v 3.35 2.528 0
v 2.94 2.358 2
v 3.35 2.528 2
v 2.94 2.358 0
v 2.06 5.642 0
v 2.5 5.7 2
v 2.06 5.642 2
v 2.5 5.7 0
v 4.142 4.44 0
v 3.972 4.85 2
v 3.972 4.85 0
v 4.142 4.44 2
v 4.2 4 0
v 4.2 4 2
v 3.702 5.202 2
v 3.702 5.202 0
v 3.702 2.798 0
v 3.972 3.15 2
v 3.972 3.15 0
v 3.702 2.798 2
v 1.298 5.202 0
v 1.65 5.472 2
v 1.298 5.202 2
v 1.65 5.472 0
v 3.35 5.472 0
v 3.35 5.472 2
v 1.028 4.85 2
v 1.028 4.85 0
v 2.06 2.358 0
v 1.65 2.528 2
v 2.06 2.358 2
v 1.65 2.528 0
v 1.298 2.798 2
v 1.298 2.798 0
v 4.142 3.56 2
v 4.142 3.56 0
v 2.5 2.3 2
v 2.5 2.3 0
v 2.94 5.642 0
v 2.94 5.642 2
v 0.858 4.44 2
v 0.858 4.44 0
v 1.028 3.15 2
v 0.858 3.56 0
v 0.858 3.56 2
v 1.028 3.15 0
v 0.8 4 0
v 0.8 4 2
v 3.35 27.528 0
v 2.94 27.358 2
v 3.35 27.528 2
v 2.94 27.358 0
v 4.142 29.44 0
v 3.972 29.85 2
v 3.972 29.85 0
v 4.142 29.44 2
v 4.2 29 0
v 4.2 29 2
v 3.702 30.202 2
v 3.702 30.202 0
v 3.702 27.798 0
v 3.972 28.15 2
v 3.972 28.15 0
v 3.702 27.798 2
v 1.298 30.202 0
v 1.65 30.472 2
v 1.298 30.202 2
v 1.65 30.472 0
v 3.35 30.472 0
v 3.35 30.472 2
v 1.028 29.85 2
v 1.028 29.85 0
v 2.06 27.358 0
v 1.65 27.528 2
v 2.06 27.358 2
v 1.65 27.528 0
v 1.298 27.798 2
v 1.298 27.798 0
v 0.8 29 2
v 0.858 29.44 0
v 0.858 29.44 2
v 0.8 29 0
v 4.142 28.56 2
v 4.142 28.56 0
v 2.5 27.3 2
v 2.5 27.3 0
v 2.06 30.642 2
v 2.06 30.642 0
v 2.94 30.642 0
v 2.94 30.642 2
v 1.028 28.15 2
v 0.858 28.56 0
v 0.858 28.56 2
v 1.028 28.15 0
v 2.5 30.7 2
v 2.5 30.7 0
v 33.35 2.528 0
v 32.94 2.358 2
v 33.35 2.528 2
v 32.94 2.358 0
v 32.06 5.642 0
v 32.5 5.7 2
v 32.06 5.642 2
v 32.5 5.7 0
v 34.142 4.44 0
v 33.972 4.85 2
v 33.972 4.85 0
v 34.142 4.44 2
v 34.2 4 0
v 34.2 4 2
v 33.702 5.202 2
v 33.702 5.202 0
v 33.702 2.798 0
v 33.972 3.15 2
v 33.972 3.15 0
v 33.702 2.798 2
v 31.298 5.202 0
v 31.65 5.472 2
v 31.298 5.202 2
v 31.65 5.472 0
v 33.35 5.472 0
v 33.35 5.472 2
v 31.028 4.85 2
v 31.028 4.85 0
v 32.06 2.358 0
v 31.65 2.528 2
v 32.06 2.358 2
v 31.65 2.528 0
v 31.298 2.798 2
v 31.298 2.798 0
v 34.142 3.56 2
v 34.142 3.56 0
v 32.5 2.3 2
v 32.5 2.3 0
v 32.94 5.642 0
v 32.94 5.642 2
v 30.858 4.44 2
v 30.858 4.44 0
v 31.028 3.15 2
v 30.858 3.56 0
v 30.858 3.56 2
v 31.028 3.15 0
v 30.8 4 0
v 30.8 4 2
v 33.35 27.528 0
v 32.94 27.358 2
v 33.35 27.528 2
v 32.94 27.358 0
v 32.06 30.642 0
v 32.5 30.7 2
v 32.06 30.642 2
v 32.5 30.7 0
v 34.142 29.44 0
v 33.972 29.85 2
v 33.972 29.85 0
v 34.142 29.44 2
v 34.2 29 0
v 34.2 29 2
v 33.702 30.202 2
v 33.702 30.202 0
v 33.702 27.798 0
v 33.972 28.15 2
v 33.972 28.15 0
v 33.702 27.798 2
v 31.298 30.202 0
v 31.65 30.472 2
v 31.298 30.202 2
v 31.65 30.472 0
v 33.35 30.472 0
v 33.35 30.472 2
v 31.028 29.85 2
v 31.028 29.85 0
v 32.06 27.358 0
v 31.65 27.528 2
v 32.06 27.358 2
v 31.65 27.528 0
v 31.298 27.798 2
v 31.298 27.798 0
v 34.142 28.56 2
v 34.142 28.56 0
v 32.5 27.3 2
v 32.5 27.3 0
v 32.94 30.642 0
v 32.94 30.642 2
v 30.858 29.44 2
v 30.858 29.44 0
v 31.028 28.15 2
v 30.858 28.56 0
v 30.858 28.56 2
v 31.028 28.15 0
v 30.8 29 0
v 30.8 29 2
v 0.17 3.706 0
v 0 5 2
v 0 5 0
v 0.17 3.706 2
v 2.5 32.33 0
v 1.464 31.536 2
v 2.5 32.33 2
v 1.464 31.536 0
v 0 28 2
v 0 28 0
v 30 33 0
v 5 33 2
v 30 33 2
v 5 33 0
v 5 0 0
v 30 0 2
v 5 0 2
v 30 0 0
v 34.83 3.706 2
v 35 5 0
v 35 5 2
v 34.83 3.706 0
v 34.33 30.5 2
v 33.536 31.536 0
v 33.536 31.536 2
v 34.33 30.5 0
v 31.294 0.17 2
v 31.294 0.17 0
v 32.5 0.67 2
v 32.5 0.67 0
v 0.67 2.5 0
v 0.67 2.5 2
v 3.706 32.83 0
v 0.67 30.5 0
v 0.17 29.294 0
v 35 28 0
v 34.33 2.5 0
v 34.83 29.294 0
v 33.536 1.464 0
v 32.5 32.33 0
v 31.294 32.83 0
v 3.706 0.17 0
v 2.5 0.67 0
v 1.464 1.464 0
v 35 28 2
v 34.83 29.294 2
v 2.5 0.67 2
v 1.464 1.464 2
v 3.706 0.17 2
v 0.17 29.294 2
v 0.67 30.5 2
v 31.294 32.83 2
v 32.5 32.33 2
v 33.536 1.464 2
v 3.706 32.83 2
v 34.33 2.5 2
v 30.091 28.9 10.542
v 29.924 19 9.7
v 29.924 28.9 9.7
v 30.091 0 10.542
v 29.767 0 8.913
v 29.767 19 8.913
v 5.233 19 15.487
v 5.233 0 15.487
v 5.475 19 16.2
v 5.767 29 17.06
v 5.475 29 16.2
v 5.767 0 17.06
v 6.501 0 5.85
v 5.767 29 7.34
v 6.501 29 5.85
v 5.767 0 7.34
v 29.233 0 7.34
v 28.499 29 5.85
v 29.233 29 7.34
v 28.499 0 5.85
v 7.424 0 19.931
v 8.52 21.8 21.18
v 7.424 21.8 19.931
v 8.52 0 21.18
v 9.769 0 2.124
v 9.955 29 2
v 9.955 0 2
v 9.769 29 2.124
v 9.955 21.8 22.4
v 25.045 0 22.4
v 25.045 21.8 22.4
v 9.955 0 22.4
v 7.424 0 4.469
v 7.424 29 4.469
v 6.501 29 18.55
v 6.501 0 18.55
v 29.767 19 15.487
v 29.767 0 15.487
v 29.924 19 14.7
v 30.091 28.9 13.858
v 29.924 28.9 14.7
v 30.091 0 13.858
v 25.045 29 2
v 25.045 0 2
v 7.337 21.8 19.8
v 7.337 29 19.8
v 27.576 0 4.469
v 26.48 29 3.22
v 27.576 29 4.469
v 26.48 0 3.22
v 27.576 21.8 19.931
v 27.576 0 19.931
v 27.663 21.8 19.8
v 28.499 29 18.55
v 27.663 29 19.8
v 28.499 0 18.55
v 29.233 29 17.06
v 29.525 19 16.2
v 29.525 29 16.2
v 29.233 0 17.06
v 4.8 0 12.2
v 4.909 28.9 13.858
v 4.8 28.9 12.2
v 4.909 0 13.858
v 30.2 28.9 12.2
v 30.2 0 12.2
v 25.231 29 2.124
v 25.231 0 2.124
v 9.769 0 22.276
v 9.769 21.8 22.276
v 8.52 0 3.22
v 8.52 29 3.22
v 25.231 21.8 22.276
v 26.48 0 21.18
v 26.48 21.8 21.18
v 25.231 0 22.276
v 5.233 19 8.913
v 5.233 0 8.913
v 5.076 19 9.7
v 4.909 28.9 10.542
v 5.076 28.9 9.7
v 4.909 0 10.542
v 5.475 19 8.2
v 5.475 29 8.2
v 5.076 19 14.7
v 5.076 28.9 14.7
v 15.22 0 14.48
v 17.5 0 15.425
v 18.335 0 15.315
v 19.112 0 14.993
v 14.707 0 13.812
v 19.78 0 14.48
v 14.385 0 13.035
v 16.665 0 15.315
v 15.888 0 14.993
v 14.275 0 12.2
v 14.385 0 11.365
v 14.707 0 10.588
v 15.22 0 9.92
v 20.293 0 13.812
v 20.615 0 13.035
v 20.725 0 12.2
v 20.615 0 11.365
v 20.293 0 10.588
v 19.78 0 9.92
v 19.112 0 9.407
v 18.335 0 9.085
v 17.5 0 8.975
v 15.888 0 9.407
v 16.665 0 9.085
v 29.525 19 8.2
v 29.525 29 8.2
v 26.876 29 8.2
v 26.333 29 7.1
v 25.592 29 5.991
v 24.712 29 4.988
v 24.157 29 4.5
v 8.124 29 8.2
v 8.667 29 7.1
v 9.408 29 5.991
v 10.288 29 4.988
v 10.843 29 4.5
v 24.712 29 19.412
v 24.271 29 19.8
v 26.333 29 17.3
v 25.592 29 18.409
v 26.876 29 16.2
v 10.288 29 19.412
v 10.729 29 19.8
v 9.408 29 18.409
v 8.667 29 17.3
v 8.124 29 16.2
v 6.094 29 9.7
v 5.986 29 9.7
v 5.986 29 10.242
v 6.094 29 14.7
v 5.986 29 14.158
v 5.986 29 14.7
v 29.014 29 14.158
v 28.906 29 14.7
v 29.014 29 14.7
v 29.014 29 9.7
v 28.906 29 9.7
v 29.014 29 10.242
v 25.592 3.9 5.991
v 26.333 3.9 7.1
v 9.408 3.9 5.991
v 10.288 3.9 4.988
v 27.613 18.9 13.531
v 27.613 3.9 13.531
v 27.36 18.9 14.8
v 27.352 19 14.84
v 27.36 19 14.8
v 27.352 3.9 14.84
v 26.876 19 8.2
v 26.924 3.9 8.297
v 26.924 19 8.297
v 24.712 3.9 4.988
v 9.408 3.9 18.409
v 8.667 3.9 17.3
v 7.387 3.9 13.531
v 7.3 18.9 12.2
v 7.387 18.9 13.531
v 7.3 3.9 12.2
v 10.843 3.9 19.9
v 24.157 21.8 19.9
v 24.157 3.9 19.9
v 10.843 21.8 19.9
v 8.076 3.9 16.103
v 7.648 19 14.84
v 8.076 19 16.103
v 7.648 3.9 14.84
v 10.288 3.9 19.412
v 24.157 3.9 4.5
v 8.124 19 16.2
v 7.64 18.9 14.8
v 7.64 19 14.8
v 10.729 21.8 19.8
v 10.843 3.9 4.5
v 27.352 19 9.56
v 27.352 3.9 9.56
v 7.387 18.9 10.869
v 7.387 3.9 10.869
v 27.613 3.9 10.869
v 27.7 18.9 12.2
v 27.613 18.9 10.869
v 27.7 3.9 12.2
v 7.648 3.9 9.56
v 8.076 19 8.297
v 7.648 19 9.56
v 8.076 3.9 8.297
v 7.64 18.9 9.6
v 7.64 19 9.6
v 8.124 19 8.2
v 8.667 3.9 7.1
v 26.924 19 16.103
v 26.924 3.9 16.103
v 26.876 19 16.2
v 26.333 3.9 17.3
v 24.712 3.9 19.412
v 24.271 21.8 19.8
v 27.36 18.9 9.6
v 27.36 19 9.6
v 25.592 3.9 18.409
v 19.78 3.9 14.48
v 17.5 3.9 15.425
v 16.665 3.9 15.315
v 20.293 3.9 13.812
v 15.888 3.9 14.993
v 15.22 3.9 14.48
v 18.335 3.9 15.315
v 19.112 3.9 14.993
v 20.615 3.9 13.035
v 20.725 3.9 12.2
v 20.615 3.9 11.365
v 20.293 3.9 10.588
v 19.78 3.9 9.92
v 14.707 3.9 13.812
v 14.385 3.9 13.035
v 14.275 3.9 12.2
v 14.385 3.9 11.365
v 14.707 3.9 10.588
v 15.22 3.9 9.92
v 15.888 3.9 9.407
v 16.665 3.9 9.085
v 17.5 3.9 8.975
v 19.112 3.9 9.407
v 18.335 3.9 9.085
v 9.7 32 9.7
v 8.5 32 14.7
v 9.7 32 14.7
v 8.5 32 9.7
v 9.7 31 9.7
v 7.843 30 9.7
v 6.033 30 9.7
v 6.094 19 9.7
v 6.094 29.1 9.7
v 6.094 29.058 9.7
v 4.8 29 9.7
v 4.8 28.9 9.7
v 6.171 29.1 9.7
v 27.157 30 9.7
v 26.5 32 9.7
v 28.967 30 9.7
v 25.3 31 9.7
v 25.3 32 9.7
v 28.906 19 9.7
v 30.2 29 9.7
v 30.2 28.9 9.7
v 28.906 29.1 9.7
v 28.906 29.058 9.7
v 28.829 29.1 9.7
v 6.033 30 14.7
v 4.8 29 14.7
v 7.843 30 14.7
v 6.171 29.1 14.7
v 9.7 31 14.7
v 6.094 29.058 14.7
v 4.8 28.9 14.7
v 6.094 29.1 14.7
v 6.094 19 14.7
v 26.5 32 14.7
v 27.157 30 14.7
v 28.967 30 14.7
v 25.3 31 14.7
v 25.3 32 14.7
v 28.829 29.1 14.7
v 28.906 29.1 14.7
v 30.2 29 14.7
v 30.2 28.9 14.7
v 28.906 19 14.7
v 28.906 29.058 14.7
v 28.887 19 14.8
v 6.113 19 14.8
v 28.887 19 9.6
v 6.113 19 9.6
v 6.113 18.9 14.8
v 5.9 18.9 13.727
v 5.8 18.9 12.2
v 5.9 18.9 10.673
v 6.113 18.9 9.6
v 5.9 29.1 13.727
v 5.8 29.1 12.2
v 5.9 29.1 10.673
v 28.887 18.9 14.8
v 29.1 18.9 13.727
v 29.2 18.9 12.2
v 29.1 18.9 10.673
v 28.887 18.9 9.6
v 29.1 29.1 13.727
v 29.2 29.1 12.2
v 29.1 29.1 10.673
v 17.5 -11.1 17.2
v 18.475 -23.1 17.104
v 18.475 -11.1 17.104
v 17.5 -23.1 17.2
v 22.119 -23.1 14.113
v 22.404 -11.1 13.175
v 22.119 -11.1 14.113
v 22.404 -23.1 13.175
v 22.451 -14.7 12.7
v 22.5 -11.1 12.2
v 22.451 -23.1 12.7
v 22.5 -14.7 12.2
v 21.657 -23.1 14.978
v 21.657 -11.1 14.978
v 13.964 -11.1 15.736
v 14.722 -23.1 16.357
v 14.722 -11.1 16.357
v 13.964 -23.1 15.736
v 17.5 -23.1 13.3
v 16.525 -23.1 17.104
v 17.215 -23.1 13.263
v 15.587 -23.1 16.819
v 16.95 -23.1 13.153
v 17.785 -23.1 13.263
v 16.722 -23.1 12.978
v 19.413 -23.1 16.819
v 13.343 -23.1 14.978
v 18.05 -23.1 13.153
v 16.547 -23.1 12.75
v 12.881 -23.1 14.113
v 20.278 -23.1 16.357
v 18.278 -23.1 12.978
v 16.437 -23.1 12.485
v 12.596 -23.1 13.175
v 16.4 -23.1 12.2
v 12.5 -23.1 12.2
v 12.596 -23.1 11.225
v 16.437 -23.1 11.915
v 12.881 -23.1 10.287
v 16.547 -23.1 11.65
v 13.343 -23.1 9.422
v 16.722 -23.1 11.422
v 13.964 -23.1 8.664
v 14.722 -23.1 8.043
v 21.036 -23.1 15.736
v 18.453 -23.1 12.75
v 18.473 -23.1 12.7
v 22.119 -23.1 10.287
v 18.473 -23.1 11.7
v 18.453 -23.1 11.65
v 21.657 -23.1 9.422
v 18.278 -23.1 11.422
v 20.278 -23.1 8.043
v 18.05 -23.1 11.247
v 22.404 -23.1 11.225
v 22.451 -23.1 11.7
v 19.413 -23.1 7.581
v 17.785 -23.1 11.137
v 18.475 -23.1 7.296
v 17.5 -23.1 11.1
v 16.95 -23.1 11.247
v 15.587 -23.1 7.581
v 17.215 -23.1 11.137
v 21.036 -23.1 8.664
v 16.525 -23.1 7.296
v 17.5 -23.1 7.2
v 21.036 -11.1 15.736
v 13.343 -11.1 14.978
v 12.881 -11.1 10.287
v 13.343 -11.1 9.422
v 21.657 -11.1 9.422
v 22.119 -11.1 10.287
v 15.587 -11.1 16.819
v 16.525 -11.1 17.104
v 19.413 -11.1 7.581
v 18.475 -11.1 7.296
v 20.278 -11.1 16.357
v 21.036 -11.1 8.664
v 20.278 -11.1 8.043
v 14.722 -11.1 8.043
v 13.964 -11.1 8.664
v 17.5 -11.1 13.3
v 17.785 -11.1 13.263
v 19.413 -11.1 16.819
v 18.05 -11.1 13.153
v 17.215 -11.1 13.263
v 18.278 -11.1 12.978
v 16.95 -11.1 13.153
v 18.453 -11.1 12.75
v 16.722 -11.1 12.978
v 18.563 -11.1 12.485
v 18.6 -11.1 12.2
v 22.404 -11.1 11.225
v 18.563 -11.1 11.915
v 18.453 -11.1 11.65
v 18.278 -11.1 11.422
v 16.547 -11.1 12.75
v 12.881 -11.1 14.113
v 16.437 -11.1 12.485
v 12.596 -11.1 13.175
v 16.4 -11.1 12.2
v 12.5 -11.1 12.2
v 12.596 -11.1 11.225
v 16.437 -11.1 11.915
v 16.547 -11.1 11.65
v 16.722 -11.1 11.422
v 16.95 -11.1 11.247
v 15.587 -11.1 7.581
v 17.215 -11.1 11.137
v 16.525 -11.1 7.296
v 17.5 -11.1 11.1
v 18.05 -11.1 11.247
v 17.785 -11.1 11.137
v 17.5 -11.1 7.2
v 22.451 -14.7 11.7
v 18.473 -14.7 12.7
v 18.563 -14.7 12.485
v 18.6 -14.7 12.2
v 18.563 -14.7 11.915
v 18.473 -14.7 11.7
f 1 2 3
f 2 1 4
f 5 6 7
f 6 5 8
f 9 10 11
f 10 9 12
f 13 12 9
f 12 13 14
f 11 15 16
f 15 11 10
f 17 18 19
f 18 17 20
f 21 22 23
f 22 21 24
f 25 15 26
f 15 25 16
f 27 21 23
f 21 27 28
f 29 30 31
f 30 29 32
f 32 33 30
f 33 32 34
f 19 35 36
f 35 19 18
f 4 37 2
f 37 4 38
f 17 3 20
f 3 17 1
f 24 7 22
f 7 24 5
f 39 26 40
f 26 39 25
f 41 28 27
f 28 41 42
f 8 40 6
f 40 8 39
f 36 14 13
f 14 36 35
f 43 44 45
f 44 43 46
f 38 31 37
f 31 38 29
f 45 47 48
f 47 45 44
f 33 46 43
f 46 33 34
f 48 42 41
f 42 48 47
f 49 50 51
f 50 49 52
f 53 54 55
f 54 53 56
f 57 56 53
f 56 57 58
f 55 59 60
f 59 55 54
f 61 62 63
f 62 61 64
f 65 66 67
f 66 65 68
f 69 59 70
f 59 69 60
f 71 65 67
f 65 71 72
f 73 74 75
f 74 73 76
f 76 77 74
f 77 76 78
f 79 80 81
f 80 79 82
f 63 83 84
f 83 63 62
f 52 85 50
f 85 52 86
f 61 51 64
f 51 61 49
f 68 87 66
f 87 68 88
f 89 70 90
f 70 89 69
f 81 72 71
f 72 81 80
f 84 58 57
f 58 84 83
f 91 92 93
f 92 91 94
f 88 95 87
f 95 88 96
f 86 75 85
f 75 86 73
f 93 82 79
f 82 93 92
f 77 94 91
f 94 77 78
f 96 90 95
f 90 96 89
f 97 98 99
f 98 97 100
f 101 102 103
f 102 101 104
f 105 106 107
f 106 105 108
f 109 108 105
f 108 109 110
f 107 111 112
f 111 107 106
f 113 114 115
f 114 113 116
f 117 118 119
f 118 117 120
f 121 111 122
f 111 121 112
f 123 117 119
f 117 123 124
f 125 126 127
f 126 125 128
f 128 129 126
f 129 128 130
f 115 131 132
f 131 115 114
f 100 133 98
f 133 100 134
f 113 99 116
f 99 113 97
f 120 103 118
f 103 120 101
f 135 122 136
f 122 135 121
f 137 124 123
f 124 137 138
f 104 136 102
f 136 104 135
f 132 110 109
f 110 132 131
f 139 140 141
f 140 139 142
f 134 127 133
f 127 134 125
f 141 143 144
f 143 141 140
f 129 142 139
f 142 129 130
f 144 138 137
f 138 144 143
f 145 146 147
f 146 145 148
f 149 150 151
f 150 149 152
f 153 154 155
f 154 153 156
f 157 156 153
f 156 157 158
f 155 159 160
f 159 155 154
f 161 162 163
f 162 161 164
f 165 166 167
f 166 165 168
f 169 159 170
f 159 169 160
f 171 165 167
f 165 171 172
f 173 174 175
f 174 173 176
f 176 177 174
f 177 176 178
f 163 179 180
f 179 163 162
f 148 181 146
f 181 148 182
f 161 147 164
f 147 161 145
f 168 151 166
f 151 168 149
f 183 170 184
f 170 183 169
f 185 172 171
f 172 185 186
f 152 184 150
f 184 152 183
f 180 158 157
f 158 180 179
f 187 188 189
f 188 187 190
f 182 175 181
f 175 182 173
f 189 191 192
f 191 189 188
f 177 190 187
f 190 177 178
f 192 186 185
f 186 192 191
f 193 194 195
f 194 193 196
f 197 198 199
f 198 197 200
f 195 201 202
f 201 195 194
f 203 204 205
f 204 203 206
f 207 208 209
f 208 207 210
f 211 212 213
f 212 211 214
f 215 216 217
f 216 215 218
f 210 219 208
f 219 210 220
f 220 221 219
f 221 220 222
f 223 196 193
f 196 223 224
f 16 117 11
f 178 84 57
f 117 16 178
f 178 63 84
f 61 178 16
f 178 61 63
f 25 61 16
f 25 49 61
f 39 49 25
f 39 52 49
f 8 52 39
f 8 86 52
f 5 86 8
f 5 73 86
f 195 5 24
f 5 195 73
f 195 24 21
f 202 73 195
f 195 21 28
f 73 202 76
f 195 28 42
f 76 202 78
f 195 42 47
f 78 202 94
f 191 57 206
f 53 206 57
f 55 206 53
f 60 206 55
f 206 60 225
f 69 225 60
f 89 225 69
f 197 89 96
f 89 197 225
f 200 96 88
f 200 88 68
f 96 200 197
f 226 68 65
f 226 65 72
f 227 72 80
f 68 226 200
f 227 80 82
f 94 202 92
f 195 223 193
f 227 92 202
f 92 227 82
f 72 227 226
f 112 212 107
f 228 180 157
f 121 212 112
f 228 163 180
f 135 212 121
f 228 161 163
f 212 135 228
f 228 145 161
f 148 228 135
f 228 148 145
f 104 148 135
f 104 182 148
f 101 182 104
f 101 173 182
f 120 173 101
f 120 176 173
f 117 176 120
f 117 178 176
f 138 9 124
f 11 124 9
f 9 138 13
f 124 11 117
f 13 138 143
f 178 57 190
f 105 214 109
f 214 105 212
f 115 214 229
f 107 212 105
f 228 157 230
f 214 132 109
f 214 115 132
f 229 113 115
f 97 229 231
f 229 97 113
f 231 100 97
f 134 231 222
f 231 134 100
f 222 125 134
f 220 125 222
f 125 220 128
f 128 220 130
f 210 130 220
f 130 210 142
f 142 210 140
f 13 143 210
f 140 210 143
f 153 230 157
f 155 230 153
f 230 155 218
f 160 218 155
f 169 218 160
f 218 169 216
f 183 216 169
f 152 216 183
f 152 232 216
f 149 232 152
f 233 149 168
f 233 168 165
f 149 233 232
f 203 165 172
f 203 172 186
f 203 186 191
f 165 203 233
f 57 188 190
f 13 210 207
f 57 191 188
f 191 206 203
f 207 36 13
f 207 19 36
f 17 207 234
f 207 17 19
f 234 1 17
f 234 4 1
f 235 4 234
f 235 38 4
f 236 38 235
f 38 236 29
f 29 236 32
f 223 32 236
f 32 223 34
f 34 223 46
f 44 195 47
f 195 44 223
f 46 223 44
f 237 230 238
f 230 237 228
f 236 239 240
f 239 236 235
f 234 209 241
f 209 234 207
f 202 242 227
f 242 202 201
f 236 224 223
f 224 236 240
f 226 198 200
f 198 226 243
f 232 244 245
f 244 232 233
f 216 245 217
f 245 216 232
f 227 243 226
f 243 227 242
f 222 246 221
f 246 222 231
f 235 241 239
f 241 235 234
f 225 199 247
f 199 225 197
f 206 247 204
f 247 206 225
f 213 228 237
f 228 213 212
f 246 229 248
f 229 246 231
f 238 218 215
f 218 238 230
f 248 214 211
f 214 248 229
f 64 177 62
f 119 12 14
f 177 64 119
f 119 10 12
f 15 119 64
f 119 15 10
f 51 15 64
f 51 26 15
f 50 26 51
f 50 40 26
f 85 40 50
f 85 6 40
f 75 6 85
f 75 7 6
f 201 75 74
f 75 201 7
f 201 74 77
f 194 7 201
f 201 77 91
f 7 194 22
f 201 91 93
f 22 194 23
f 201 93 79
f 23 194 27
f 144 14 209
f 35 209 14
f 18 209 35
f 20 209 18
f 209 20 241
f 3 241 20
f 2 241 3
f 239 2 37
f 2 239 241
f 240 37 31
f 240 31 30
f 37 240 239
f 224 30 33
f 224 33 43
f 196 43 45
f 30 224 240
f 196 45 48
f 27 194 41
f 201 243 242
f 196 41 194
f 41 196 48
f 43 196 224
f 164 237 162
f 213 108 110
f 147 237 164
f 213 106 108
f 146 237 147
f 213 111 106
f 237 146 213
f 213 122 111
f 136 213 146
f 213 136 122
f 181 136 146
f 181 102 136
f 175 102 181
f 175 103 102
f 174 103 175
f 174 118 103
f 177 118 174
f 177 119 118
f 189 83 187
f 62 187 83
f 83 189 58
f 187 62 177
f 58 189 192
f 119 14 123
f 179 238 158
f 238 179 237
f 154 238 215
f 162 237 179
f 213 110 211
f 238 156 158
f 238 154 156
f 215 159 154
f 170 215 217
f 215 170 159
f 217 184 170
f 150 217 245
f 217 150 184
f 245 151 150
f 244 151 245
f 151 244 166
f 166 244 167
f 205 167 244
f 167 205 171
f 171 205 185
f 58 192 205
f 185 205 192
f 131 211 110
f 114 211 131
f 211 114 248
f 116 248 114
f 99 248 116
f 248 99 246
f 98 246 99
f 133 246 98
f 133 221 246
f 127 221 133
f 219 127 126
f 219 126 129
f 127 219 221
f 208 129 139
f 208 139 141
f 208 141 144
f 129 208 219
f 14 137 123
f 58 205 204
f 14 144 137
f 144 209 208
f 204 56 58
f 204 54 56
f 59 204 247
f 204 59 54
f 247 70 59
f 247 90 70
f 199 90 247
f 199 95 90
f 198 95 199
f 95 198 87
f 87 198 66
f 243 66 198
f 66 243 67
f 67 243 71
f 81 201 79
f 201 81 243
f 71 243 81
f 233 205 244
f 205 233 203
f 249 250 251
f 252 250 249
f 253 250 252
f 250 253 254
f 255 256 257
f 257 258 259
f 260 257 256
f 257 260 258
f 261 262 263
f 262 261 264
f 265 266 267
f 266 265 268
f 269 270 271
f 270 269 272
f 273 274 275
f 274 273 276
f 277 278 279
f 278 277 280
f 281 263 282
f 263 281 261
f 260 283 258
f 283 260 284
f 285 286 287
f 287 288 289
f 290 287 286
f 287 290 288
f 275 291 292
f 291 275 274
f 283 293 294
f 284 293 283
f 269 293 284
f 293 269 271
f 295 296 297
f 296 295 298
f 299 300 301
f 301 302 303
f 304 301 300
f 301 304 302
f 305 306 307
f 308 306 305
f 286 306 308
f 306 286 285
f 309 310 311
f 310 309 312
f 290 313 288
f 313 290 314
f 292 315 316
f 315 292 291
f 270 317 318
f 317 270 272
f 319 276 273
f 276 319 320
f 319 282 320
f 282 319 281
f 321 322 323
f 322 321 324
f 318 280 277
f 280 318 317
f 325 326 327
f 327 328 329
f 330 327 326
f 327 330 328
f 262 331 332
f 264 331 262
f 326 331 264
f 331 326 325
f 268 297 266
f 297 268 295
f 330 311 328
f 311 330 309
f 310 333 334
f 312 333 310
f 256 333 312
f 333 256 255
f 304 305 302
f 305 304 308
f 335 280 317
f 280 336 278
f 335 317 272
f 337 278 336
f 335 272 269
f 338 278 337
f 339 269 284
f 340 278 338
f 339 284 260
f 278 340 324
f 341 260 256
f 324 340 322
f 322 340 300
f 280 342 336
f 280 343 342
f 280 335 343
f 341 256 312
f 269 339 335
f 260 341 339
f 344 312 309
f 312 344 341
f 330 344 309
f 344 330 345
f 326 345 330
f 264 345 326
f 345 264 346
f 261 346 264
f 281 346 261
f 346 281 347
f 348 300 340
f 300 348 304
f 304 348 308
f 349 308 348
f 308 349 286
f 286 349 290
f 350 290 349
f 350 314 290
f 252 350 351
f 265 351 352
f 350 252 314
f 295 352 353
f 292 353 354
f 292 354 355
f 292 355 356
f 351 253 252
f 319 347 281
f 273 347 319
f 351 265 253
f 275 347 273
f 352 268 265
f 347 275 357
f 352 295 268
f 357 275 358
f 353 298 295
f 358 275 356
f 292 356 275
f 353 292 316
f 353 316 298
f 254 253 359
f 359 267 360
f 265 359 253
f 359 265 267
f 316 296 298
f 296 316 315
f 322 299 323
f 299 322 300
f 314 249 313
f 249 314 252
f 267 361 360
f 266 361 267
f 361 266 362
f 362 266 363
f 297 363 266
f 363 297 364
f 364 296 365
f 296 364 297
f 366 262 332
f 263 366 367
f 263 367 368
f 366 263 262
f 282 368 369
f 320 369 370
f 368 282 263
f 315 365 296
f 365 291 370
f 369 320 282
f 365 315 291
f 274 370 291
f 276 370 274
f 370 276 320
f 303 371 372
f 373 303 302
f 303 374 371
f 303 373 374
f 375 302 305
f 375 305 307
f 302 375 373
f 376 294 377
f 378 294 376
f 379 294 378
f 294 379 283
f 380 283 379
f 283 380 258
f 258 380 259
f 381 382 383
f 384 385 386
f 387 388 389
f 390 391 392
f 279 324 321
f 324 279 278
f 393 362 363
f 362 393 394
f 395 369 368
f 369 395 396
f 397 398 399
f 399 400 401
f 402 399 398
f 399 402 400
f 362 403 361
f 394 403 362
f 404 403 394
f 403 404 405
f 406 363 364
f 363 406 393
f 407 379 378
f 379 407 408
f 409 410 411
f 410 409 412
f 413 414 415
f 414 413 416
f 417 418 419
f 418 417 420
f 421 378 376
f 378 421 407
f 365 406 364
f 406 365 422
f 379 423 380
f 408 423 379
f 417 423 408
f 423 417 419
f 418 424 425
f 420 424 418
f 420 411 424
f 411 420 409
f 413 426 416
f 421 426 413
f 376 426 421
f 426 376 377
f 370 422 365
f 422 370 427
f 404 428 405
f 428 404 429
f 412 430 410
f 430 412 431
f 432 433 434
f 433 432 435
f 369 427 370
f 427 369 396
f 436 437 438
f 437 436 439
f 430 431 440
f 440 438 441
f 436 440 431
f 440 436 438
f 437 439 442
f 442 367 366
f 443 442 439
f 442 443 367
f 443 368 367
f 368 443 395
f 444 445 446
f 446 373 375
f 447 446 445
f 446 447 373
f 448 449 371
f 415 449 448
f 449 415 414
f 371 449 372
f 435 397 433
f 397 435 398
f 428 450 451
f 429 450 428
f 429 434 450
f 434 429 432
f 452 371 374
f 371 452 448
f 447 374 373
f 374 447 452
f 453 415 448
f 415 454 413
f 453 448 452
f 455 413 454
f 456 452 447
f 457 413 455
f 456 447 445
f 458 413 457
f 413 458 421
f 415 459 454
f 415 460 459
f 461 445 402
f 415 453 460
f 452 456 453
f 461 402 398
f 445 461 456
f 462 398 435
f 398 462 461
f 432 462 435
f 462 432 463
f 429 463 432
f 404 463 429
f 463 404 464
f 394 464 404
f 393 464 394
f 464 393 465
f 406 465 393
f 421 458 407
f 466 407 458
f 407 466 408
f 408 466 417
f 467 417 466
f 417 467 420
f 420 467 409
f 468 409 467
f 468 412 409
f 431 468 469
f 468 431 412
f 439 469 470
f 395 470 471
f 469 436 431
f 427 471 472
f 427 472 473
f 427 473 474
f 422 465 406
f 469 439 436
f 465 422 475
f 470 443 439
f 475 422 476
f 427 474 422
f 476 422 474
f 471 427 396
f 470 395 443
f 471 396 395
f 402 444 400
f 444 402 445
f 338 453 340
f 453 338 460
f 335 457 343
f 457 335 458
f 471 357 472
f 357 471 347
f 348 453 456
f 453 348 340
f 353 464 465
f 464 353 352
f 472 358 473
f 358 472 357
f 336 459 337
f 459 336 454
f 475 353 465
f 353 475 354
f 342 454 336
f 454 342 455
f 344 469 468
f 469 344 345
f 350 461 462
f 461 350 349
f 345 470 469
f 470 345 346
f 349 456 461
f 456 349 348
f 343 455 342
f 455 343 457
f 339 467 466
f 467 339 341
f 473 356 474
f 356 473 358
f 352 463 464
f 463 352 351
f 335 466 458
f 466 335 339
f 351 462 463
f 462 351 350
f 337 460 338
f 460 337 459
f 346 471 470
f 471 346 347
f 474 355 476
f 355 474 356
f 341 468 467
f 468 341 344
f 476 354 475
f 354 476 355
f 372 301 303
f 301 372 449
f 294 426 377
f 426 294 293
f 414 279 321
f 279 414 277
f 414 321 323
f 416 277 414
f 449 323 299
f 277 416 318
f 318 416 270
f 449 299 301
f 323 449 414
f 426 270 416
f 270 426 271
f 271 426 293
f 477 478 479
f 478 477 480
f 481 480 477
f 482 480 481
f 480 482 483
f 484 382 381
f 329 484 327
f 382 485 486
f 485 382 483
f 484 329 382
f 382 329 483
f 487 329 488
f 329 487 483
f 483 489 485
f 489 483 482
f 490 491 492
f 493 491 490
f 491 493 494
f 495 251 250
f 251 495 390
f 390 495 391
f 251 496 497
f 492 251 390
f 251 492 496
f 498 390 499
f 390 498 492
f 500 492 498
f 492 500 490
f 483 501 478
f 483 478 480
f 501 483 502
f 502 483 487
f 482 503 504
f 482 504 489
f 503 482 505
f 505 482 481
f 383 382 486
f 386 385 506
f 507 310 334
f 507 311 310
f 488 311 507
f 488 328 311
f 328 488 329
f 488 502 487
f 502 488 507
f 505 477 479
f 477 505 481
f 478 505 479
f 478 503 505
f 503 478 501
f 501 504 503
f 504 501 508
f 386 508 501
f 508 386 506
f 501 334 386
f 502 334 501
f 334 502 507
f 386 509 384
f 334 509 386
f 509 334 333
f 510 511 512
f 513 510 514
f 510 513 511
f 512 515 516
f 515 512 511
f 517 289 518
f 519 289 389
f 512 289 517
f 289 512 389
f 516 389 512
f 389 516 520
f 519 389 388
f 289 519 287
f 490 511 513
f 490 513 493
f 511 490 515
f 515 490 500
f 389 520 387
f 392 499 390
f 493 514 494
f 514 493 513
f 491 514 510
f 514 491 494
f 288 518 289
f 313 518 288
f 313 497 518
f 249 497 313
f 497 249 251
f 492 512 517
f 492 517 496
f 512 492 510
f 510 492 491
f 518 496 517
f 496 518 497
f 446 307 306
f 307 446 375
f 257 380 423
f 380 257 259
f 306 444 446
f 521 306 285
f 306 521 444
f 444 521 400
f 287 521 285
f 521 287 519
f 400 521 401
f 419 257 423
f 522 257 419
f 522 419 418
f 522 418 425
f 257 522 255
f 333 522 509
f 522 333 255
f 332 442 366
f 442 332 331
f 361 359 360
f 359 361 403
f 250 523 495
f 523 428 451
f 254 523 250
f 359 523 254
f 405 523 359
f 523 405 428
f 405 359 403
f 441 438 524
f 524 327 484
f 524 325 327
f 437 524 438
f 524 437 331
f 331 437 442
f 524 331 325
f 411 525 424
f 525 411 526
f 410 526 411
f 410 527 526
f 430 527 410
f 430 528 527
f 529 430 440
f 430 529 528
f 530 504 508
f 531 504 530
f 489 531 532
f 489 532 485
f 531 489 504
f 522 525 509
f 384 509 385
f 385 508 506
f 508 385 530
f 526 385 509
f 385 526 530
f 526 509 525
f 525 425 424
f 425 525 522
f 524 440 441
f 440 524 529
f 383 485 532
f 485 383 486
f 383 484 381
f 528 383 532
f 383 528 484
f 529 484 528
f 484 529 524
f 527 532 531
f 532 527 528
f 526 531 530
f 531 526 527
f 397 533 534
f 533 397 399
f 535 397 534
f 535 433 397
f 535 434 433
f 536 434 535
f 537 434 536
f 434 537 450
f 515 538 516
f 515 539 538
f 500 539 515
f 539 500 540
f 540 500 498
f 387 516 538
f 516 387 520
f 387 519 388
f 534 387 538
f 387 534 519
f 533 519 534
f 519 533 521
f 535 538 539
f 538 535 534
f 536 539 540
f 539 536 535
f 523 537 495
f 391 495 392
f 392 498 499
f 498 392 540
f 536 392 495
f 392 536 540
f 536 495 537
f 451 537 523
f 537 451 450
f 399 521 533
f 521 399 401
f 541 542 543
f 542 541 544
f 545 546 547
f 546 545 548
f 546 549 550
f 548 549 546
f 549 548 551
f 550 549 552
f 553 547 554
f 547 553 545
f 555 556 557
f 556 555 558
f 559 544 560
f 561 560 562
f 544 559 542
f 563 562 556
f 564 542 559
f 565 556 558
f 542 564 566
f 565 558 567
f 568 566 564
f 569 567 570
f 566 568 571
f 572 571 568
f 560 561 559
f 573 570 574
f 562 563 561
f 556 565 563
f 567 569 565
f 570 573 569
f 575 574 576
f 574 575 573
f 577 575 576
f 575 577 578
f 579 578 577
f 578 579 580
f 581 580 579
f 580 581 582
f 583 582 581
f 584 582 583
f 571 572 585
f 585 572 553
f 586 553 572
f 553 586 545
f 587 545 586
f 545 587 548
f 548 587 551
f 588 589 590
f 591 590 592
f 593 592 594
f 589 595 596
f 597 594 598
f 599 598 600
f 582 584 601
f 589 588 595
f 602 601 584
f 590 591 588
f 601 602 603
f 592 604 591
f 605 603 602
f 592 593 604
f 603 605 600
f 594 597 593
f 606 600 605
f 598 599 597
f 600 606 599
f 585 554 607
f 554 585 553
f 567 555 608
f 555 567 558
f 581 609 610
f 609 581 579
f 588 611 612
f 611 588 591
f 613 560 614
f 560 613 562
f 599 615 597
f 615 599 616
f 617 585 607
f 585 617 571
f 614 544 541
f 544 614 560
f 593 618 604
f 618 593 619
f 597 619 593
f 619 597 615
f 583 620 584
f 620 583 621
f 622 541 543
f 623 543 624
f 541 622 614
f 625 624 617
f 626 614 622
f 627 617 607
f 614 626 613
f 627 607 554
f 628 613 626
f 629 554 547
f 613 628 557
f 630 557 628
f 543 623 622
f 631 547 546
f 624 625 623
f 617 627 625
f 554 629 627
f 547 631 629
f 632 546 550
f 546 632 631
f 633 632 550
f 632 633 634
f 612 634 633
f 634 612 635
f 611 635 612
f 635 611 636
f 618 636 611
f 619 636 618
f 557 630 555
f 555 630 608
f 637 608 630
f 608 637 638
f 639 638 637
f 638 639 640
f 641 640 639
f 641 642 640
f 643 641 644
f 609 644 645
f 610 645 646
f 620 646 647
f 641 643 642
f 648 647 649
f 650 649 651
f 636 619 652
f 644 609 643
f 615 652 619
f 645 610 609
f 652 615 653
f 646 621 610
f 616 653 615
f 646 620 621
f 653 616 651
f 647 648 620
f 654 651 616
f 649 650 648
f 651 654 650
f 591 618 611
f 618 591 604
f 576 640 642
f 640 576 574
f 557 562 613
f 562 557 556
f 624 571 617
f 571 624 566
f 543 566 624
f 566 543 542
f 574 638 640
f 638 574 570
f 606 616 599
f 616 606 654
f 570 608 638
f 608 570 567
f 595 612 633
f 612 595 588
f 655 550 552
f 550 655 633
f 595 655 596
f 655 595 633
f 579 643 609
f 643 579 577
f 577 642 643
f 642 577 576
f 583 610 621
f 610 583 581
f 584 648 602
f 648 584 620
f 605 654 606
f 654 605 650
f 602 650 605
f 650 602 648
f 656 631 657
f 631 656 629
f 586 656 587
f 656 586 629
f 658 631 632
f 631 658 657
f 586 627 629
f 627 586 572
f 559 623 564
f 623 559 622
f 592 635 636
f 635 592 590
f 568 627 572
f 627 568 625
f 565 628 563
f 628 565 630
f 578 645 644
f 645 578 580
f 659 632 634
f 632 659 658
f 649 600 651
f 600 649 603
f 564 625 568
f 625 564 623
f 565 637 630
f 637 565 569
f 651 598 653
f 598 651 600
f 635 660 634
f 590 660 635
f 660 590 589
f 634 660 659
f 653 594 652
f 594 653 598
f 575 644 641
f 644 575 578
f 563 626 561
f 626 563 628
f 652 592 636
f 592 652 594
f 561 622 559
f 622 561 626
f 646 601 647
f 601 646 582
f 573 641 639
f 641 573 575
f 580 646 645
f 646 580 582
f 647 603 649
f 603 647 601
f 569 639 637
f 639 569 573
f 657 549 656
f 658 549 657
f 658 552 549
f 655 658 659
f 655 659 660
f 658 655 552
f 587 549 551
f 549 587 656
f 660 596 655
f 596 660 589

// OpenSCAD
// FA-130 Mount Demo
// FA-130 マウントデモ
//
// 横向きマウントの例（モーターを側面から挿入）
//
// 外形: 40mm x 33mm x 25mm
// 使用モーター: FA-130 x1
// 使用ネジ: M3 x4（ベース固定用）
//
// ビルド:
//   openscad -o fa130_mount_demo.stl fa130_mount_demo.scad

include <../mabuchi_motor.scad>

// ===== Customizer パラメータ =====

/* [表示設定] */
// モーターモデルを表示（フィットチェック用）
show_motor = false;

// カップラーを表示
show_coupler = true;

// マウントを表示
show_mount = true;

// ベースを表示
show_base = true;

/* [マウント設定] */
// 嵌合クリアランス
tolerance = 0.3; // [0.1:0.05:0.5]

// 壁厚
wall = 2.5; // [1.5:0.5:4]

// ベース厚
base = 4; // [2:1:6]

/* [カップラー設定] */
// カップラー外径
coupler_outer_d = 10; // [6:1:16]

// カップラー長さ
coupler_length = 12; // [8:1:20]

// スリット追加
coupler_with_slit = true;

// ===== 定数 =====

// マウント外形（外部定数から計算）
mount_outer_d = fa130_housing_d + tolerance + wall * 2;
mount_outer_h = fa130_housing_h + tolerance + wall * 2;
mount_len = fa130_body_len + base;

// ベース寸法
base_w = 35;  // タミヤユニバーサルプレート対応
base_d = mount_len + 4;  // マウント長 + 余裕
base_h = 2;

// 取付穴（M3）- タミヤユニバーサルプレート 5mm ピッチ対応
mount_hole_d = 3.4;  // M3 クリアランス
mount_hole_pitch_x = 30;  // X方向ピッチ (5mm x 6)
mount_hole_pitch_y = 25;  // Y方向ピッチ (5mm x 5)

// ===== モジュール =====

// マウント配置（横向き: シャフトが -Y 方向、モーターは +Y から挿入）
// rotate([180, 0, 90]) で端子側を上、シャフトを Y 方向に
// マウント位置（中央配置）
mount_x = base_w / 2;
mount_y = 0;  // シャフト側をベース前端（Y=0）に揃える
mount_z = base_h + mount_outer_h / 2;

// マウントユニット（ベースプレート + マウント + インジケータ/カップラー位置）
// シャフトは -Y 方向に出る
// 原点: ベースプレートの (0,0,0) 角
module fa130_mount_unit(show_base = true, show_mount = true, show_motor = false) {
    // ベースプレート
    if (show_base) {
        color("white")
        difference() {
            // 角丸プレート
            hull() {
                for (x = [5, base_w - 5], y = [5, base_d - 5]) {
                    translate([x, y, 0])
                        cylinder(h = base_h, r = 5, $fn = 24);
                }
            }

            // 取付穴（4隅）- 中央基準でピッチ配置
            for (dx = [-1, 1], dy = [-1, 1]) {
                translate([base_w/2 + dx * mount_hole_pitch_x/2,
                           base_d/2 + dy * mount_hole_pitch_y/2,
                           -0.1])
                    cylinder(h = base_h + 0.2, d = mount_hole_d, $fn = 24);
            }
        }
    }

    // モーターマウント（横向き、端子が上、シャフトが -Y 方向）
    if (show_mount) {
        color("white")
        translate([mount_x, mount_y, mount_z])
            rotate([180, 0, 90])
                mabuchi_motor_fa130_mount(wall = wall, base = base, tolerance = tolerance,
                                           anchor = "motor");
    }

    // フィットチェック用モーター
    if (show_motor) {
        translate([mount_x, mount_y, mount_z])
            rotate([180, 0, 90])
                mabuchi_motor_fa130_in_mount(base = base);
    }
}

// シャフト先端位置（インジケータ/カップラー配置用）
shaft_tip_y = mount_y - (fa130_shaft_protrusion + fa130_bearing_holder_len);

// ===== 単体表示（include 元でない場合）=====

if (is_undef(_fa130_mount_demo_included)) {
    fa130_mount_unit(show_base, show_mount, show_motor);

    // カップラー
    if (show_coupler) {
        color("orange")
        if (show_mount) {
            translate([mount_x, shaft_tip_y, mount_z])
                rotate([90, 0, 0])
                    fa130_shaft_coupler(outer_d = coupler_outer_d, length = coupler_length,
                                        with_slit = coupler_with_slit);
        } else {
            fa130_shaft_coupler(outer_d = coupler_outer_d, length = coupler_length,
                                with_slit = coupler_with_slit);
        }
    }
}
